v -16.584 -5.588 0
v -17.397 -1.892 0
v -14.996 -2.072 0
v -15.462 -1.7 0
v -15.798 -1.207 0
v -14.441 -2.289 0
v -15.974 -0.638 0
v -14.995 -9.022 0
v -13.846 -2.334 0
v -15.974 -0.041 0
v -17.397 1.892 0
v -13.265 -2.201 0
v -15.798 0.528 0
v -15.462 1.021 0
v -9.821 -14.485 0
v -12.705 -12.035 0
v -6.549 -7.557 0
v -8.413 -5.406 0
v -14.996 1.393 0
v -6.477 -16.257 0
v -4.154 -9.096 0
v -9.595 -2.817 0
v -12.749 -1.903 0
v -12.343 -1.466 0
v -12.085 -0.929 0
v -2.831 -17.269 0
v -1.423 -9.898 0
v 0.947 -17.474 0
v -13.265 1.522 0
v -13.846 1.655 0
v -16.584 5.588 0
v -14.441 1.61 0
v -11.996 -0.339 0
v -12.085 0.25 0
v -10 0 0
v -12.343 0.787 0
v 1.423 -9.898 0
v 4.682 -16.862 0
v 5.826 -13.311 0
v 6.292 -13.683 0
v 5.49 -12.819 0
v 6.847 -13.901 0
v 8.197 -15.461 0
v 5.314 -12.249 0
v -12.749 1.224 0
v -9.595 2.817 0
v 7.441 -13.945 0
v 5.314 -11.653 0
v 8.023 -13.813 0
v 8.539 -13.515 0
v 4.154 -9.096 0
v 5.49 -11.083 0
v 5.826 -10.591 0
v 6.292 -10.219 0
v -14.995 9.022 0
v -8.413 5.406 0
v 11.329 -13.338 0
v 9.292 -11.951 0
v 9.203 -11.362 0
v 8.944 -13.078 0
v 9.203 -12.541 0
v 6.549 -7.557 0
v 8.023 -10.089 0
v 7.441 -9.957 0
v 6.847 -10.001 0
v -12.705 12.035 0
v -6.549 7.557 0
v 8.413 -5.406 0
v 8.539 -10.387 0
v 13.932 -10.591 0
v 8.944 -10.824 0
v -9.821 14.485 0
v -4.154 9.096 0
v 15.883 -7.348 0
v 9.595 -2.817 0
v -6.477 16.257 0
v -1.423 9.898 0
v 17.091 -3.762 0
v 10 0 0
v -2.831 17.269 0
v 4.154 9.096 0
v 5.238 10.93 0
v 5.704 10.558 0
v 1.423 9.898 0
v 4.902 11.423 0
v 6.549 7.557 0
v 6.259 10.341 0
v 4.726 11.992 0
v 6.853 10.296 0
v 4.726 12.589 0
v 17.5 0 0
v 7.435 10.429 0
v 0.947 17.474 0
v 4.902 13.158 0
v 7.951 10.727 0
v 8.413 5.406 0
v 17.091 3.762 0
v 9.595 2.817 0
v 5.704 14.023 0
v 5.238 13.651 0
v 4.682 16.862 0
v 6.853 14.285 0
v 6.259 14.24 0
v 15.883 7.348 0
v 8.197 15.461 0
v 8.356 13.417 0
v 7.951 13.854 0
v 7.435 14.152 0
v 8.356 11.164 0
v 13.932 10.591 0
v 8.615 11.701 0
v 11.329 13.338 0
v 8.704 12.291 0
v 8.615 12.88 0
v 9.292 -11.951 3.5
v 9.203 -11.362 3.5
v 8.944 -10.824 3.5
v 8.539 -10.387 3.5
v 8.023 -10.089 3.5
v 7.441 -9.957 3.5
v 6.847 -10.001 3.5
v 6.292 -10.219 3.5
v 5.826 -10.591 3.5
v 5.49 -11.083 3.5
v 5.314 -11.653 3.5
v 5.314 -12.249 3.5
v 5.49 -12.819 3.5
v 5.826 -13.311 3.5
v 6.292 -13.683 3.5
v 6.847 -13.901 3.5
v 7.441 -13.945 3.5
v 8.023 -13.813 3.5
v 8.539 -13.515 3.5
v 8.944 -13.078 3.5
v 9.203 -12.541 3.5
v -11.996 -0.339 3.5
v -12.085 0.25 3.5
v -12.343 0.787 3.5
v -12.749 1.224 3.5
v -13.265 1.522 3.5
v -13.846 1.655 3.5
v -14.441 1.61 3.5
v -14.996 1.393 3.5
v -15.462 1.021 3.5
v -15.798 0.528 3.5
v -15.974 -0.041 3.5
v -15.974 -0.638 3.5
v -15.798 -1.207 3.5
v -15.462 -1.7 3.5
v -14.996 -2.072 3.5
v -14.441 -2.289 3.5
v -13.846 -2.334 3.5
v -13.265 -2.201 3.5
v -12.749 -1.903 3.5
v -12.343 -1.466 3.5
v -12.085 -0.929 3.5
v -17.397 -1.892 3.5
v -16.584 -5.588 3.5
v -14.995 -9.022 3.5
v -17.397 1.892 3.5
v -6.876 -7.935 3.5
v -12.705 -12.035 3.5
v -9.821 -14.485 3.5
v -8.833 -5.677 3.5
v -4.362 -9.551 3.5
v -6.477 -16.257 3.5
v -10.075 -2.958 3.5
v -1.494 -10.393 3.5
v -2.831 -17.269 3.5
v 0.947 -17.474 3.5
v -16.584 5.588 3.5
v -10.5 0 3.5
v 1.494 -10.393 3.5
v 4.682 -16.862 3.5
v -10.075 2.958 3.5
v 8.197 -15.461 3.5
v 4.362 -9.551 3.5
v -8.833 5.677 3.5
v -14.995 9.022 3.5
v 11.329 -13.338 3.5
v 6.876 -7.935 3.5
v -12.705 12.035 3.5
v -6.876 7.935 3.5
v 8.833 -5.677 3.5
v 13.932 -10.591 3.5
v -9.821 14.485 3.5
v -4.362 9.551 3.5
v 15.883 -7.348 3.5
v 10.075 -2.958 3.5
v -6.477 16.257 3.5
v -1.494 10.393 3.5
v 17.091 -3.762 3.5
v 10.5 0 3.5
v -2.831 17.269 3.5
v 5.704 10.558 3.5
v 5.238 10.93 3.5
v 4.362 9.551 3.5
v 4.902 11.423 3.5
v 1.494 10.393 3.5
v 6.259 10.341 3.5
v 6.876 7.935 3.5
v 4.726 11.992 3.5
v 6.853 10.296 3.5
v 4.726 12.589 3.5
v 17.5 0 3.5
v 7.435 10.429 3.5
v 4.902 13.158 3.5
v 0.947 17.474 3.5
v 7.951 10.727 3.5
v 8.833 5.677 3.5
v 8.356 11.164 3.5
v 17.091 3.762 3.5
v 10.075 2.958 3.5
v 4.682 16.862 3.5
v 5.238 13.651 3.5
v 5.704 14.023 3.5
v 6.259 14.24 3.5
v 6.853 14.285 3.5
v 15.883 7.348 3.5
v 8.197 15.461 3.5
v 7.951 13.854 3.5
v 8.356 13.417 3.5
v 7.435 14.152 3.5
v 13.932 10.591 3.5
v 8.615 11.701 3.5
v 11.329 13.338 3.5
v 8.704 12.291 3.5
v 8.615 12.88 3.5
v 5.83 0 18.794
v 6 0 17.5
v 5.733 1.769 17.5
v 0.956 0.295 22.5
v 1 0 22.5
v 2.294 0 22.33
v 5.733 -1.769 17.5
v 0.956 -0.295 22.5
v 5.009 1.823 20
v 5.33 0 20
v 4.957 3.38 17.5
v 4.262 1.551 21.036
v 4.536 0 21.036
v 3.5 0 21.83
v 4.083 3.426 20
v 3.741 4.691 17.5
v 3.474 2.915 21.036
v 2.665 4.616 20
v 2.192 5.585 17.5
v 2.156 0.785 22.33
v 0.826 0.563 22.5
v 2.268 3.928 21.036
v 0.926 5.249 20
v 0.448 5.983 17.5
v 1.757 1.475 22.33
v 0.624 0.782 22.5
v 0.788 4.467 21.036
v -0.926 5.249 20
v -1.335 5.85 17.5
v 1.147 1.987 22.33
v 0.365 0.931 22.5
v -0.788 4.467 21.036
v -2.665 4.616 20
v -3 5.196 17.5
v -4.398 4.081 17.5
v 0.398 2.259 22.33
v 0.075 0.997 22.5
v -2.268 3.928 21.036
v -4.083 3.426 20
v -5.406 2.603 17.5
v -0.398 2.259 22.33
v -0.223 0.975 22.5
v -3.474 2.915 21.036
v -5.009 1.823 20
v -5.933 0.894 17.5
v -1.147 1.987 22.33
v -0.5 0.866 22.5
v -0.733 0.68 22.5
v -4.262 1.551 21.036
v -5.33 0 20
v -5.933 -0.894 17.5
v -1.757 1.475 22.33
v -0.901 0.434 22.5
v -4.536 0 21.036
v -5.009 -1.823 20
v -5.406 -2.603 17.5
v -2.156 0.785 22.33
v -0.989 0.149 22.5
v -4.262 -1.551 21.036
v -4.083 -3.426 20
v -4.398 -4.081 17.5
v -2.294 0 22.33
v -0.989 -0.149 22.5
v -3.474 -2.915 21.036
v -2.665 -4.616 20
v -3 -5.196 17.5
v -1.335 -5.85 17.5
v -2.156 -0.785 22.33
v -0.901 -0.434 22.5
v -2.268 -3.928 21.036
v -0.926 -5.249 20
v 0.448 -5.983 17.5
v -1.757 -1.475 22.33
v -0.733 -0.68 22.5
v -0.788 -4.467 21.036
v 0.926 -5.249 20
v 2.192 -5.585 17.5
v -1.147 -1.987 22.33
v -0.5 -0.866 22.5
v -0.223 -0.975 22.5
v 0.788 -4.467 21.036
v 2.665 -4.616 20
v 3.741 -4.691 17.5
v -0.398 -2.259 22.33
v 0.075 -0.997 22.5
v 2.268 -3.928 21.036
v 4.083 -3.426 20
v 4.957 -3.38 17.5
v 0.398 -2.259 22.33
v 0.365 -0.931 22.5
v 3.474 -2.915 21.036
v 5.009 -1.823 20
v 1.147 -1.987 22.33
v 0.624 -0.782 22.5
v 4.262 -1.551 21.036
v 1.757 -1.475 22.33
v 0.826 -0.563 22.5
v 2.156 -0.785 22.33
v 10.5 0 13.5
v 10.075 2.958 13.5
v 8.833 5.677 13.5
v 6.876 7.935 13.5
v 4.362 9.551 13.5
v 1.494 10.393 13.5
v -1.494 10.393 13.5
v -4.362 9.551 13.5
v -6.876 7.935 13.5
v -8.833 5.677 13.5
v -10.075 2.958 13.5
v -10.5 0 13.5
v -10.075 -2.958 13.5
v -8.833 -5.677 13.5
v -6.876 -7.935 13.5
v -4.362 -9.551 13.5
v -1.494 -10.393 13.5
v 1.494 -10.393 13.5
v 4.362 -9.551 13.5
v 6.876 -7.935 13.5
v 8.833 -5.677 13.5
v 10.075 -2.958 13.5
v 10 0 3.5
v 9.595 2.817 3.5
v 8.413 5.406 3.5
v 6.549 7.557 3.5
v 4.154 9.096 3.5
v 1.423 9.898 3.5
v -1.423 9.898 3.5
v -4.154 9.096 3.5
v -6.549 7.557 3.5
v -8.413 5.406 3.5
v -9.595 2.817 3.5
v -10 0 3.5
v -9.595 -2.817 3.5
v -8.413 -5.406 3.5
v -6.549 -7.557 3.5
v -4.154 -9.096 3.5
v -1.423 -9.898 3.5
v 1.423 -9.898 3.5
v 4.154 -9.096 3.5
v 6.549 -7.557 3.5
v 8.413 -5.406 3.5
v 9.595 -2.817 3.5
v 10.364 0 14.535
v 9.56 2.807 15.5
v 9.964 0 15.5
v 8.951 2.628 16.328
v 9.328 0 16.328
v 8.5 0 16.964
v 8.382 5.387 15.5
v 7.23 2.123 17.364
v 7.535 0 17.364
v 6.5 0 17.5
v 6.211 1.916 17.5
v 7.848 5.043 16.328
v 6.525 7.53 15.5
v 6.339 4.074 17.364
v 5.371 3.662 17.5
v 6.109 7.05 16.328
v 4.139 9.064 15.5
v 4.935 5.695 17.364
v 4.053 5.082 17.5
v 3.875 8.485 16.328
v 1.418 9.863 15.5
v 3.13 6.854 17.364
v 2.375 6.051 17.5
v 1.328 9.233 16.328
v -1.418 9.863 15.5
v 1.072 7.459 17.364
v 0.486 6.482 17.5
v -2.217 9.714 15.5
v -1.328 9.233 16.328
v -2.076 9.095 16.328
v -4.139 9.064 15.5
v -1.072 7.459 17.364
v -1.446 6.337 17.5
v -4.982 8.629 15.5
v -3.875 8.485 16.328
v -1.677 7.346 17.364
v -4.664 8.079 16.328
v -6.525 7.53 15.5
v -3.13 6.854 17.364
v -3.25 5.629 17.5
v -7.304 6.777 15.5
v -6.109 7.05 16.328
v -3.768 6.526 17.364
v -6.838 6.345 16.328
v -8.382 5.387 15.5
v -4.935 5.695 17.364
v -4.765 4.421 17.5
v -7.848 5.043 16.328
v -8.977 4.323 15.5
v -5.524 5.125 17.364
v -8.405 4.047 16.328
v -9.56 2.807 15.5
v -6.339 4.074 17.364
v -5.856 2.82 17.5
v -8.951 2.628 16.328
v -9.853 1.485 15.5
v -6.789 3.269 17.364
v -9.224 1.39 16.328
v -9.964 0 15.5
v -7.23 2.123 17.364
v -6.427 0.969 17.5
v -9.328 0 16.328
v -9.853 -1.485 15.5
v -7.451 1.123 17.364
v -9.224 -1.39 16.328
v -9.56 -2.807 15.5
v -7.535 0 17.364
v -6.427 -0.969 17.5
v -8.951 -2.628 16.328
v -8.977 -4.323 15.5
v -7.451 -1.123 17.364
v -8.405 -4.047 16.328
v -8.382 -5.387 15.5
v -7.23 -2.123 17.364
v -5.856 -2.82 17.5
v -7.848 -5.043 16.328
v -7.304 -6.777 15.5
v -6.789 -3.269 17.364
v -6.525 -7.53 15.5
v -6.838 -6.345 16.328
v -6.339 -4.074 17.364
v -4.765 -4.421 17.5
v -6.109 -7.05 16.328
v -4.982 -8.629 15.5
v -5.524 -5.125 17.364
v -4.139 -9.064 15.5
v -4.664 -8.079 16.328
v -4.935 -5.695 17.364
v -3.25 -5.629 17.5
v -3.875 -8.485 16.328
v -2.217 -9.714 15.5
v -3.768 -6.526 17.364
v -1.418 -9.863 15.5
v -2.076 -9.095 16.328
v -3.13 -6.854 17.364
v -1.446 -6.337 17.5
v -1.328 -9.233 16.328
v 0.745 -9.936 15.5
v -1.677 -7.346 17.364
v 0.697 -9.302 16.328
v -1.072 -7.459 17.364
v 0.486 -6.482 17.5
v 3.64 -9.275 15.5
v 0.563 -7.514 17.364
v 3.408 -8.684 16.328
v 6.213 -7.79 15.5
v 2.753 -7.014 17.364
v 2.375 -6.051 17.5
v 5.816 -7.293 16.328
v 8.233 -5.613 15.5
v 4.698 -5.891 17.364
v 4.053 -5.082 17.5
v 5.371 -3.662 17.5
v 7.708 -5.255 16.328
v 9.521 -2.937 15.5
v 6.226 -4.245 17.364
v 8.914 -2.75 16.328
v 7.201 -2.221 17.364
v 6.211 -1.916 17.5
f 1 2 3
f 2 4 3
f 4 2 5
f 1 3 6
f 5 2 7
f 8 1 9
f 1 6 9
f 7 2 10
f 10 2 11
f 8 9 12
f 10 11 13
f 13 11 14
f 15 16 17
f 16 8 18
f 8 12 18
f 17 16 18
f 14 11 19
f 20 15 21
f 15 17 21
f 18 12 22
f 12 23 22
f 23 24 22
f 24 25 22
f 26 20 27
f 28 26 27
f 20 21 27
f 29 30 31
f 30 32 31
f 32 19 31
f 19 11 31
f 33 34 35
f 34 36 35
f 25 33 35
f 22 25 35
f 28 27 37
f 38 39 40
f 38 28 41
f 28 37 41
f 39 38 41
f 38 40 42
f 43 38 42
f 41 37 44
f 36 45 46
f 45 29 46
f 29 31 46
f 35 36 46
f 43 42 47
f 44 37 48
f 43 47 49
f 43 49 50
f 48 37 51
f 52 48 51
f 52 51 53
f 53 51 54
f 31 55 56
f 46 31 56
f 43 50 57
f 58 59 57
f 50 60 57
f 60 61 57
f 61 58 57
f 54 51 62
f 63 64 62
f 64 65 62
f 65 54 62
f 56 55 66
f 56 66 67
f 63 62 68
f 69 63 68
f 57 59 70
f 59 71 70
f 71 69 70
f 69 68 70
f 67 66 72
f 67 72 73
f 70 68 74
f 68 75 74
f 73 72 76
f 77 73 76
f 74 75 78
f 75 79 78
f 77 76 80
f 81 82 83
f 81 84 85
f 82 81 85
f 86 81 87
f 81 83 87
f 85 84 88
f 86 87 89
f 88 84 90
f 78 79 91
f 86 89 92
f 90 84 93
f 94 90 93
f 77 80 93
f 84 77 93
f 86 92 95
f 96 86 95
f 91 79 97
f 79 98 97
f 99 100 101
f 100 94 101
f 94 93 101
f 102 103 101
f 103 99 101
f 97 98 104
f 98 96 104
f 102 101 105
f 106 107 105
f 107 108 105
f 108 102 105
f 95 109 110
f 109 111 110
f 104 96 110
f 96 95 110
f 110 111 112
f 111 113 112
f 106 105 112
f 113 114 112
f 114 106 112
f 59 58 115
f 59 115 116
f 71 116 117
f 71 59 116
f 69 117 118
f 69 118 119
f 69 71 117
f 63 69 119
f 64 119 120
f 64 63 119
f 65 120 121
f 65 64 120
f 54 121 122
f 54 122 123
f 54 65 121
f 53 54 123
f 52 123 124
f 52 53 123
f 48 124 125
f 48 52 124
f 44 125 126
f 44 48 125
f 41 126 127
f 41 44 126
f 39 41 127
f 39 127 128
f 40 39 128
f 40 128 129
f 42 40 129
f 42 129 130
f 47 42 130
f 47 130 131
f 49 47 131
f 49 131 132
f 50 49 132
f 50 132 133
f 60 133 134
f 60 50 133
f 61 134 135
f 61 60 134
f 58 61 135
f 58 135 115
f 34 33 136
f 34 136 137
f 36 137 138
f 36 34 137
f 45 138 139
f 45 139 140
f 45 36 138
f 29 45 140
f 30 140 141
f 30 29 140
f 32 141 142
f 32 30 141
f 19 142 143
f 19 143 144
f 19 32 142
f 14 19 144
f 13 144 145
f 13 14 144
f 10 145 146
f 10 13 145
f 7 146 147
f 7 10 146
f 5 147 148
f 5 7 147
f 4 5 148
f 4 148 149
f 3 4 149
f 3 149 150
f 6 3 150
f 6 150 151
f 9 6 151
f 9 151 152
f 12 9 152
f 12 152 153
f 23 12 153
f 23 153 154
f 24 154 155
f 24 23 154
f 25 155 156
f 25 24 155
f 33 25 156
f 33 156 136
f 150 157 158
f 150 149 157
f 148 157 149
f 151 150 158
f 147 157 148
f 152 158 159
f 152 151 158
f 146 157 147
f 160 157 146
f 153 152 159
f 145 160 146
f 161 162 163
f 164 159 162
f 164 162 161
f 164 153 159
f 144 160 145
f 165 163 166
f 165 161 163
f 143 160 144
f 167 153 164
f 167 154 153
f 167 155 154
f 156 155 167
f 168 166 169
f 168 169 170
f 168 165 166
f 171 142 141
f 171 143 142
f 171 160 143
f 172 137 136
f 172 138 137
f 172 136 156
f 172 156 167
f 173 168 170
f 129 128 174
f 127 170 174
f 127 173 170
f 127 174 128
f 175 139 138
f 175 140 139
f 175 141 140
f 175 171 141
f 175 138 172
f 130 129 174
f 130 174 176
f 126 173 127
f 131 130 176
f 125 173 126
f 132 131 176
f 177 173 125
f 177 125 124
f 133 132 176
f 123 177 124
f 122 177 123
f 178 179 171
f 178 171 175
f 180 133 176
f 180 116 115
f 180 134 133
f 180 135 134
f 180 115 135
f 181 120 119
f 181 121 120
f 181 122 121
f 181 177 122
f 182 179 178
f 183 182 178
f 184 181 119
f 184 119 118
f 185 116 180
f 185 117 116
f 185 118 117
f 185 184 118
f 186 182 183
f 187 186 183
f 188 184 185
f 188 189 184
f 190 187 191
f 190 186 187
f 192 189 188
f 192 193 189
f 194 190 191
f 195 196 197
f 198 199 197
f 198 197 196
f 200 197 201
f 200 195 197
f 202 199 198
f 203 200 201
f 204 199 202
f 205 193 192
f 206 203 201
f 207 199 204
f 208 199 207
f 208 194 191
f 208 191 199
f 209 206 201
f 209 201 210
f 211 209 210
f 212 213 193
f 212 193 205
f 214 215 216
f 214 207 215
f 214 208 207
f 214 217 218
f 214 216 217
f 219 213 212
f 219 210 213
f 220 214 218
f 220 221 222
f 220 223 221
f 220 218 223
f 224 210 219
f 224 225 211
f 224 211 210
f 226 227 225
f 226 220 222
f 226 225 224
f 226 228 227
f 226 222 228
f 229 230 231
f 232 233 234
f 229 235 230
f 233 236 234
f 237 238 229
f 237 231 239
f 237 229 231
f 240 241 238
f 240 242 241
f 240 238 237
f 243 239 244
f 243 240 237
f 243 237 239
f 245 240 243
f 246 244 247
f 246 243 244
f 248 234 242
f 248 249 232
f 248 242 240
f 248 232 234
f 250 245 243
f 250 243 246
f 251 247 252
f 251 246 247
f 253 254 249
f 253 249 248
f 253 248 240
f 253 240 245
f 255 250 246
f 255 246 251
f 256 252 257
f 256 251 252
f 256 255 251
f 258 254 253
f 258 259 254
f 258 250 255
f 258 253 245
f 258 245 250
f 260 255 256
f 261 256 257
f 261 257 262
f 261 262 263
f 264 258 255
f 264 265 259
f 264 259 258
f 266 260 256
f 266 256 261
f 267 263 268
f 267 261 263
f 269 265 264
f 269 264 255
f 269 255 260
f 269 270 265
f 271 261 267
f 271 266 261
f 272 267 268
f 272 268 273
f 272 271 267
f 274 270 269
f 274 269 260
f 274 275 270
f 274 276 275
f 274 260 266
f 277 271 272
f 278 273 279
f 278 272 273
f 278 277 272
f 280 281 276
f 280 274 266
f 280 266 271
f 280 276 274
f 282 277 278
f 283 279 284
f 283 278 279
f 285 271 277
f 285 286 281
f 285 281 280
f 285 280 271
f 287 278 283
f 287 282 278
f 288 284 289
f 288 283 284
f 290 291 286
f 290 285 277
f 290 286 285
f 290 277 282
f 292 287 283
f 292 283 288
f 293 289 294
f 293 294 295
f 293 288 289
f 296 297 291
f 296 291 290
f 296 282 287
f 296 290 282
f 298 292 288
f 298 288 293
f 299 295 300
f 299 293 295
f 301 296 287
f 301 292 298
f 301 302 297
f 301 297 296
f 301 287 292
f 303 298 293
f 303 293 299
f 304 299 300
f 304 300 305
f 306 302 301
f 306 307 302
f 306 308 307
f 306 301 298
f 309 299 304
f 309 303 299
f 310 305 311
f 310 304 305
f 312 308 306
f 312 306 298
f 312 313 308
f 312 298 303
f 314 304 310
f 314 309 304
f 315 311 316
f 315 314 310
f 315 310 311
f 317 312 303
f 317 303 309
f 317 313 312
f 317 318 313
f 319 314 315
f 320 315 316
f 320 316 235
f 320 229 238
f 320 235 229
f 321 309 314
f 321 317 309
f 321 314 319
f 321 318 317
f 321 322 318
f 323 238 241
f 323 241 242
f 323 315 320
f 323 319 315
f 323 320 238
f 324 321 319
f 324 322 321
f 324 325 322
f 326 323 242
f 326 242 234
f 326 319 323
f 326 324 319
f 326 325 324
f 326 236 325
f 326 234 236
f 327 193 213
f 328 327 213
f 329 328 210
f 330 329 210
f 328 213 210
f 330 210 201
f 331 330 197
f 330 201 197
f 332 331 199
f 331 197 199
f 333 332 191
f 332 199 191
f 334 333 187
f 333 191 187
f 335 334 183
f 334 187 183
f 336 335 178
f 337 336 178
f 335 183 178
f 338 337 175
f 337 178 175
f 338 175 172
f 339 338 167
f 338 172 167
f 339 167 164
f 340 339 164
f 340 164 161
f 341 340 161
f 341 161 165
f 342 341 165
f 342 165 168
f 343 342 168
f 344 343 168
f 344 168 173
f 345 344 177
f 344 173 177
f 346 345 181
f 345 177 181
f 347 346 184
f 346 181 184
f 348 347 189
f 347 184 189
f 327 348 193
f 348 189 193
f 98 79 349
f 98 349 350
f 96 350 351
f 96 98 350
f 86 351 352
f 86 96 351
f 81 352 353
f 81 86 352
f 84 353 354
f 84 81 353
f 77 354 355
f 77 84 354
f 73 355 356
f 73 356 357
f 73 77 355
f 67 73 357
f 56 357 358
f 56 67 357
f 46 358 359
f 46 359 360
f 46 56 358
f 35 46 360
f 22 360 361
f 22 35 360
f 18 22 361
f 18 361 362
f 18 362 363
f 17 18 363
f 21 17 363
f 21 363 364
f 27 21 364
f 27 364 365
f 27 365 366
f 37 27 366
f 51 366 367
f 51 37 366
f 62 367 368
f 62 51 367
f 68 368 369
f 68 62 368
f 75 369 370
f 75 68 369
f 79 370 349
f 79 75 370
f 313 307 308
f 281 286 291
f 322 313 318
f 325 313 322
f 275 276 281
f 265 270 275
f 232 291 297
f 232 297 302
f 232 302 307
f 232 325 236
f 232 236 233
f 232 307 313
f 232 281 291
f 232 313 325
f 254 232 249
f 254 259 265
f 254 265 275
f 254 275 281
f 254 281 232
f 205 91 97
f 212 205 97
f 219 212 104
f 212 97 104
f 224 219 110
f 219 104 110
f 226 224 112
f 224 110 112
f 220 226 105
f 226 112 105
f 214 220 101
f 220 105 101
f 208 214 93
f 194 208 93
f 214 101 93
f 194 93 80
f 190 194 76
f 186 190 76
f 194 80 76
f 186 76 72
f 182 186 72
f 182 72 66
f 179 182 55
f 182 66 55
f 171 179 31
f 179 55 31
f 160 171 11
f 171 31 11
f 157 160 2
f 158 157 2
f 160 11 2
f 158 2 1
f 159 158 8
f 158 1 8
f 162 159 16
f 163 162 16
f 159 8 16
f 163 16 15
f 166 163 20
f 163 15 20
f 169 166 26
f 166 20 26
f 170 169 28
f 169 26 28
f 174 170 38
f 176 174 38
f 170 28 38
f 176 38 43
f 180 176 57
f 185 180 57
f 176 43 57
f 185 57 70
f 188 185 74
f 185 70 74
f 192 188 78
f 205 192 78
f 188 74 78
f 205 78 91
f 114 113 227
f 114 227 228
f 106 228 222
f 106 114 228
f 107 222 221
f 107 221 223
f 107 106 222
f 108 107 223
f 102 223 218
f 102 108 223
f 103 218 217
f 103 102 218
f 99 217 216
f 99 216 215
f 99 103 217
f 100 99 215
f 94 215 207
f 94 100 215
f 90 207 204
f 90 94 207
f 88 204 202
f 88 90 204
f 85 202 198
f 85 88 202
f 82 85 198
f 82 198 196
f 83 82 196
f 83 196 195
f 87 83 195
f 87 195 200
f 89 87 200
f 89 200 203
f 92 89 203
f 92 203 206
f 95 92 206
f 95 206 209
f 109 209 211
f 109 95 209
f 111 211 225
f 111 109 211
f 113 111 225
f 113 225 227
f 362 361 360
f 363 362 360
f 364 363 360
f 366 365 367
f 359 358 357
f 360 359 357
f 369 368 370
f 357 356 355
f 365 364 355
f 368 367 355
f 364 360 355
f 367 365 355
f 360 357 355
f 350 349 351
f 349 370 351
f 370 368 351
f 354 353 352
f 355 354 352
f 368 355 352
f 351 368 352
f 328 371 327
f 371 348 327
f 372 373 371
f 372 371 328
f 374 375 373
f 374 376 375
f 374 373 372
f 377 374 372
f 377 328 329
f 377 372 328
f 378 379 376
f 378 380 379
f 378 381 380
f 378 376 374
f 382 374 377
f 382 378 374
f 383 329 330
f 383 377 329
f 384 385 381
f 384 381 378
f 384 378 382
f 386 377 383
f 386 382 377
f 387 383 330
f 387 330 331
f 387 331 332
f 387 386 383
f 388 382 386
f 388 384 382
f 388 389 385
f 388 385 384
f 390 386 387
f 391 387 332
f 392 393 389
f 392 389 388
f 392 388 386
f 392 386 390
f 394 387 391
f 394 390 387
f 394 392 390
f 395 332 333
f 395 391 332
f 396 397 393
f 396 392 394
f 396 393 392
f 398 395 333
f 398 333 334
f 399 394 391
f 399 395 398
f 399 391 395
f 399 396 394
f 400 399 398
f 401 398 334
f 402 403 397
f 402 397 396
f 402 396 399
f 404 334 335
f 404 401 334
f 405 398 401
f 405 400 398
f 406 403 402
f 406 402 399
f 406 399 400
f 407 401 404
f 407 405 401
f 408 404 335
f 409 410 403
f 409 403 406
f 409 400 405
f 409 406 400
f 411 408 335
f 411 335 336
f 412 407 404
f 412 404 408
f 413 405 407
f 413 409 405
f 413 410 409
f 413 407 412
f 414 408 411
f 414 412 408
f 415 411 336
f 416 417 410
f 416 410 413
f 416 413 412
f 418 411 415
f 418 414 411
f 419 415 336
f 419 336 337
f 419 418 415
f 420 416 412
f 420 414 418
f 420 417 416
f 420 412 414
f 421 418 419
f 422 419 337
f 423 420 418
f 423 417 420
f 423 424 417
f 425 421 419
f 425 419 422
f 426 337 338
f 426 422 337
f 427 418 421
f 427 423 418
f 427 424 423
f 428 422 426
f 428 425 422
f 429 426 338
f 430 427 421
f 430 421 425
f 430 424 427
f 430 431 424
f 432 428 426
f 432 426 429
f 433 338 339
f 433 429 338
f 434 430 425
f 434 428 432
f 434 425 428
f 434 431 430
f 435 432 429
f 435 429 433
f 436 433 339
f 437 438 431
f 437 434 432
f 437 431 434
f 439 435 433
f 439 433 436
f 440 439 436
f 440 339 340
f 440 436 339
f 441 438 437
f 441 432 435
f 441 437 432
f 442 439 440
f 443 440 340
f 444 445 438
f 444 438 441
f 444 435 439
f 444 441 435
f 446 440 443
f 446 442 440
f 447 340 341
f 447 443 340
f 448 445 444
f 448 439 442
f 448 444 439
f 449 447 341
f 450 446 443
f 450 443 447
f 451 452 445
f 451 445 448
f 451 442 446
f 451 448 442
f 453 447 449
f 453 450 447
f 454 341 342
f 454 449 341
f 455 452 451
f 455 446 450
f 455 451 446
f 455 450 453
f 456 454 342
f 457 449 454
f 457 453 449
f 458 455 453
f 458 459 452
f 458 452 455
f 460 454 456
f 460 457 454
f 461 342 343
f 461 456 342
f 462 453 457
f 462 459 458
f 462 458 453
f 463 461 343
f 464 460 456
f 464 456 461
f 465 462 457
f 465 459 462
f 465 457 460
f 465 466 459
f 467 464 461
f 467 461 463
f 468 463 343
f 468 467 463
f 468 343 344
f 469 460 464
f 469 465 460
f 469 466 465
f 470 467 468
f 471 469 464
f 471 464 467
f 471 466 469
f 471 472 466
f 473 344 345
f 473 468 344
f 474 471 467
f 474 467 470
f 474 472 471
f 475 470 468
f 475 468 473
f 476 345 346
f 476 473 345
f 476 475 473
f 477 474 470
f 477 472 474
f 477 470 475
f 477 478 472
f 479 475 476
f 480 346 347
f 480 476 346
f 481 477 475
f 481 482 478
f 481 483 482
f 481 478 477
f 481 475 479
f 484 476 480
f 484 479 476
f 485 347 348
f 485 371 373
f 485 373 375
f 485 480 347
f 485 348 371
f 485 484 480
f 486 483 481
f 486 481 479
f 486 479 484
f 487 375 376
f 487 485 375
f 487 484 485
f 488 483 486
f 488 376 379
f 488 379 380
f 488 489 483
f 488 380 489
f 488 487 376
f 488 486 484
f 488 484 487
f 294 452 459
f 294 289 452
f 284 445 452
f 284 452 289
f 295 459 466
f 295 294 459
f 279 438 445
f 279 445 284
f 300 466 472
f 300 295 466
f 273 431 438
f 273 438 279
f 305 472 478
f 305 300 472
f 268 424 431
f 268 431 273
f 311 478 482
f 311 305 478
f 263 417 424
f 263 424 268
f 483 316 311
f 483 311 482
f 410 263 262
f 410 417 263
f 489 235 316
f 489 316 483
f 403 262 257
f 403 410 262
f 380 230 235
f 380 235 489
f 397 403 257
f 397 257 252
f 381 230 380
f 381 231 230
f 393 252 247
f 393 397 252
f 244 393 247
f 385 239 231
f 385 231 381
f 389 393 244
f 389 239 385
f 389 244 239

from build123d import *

# Parameters (mm, degrees)
SKETCH1_R           = 17.5
SKETCH1_R_2         = 10
SKETCH1_R_3         = 2
BOSS_EXTRUDE1_DEPTH = 3.5
SKETCH3_R           = 10.5
BOSS_EXTRUDE2_DEPTH = 14
FILLET1_R           = 4
SKETCH4_R           = 6
BOSS_EXTRUDE3_DEPTH = 5
FILLET2_R           = 5


with BuildPart() as part:
    # Sketch1 → Boss-Extrude1 (new body)
    with BuildSketch(Plane.XY):
        Circle(SKETCH1_R)
        Circle(SKETCH1_R_2, mode=Mode.SUBTRACT)
        with Locations((6.70392983, 12.290538021)):
            Circle(SKETCH1_R_3, mode=Mode.SUBTRACT)
        with Locations((7.291953237, -11.951042548)):
            Circle(SKETCH1_R_3, mode=Mode.SUBTRACT)
        with Locations((-13.995883067, -0.339495473)):
            Circle(SKETCH1_R_3, mode=Mode.SUBTRACT)
    extrude(amount=BOSS_EXTRUDE1_DEPTH)

    # Sketch3 → Boss-Extrude2 (add)
    with BuildSketch(Plane.XY.offset(3.5)):
        Circle(SKETCH3_R)
    extrude(amount=BOSS_EXTRUDE2_DEPTH)

    # Fillet1
    fillet1_edges = [part.edges().sort_by_distance(p)[0] for p in [
        (-10.5, 0, 17.5),
    ]]
    fillet(fillet1_edges, radius=FILLET1_R)

    # Sketch4 → Boss-Extrude3 (add)
    with BuildSketch(Plane.XY.offset(17.5)):
        Circle(SKETCH4_R)
    extrude(amount=BOSS_EXTRUDE3_DEPTH)

    # Fillet2
    fillet2_edges = [part.edges().sort_by_distance(p)[0] for p in [
        (-6, 0, 22.5),
    ]]
    fillet(fillet2_edges, radius=FILLET2_R - 0.0001)  # a hair under: the kernel refuses the full size


solid = part.part
